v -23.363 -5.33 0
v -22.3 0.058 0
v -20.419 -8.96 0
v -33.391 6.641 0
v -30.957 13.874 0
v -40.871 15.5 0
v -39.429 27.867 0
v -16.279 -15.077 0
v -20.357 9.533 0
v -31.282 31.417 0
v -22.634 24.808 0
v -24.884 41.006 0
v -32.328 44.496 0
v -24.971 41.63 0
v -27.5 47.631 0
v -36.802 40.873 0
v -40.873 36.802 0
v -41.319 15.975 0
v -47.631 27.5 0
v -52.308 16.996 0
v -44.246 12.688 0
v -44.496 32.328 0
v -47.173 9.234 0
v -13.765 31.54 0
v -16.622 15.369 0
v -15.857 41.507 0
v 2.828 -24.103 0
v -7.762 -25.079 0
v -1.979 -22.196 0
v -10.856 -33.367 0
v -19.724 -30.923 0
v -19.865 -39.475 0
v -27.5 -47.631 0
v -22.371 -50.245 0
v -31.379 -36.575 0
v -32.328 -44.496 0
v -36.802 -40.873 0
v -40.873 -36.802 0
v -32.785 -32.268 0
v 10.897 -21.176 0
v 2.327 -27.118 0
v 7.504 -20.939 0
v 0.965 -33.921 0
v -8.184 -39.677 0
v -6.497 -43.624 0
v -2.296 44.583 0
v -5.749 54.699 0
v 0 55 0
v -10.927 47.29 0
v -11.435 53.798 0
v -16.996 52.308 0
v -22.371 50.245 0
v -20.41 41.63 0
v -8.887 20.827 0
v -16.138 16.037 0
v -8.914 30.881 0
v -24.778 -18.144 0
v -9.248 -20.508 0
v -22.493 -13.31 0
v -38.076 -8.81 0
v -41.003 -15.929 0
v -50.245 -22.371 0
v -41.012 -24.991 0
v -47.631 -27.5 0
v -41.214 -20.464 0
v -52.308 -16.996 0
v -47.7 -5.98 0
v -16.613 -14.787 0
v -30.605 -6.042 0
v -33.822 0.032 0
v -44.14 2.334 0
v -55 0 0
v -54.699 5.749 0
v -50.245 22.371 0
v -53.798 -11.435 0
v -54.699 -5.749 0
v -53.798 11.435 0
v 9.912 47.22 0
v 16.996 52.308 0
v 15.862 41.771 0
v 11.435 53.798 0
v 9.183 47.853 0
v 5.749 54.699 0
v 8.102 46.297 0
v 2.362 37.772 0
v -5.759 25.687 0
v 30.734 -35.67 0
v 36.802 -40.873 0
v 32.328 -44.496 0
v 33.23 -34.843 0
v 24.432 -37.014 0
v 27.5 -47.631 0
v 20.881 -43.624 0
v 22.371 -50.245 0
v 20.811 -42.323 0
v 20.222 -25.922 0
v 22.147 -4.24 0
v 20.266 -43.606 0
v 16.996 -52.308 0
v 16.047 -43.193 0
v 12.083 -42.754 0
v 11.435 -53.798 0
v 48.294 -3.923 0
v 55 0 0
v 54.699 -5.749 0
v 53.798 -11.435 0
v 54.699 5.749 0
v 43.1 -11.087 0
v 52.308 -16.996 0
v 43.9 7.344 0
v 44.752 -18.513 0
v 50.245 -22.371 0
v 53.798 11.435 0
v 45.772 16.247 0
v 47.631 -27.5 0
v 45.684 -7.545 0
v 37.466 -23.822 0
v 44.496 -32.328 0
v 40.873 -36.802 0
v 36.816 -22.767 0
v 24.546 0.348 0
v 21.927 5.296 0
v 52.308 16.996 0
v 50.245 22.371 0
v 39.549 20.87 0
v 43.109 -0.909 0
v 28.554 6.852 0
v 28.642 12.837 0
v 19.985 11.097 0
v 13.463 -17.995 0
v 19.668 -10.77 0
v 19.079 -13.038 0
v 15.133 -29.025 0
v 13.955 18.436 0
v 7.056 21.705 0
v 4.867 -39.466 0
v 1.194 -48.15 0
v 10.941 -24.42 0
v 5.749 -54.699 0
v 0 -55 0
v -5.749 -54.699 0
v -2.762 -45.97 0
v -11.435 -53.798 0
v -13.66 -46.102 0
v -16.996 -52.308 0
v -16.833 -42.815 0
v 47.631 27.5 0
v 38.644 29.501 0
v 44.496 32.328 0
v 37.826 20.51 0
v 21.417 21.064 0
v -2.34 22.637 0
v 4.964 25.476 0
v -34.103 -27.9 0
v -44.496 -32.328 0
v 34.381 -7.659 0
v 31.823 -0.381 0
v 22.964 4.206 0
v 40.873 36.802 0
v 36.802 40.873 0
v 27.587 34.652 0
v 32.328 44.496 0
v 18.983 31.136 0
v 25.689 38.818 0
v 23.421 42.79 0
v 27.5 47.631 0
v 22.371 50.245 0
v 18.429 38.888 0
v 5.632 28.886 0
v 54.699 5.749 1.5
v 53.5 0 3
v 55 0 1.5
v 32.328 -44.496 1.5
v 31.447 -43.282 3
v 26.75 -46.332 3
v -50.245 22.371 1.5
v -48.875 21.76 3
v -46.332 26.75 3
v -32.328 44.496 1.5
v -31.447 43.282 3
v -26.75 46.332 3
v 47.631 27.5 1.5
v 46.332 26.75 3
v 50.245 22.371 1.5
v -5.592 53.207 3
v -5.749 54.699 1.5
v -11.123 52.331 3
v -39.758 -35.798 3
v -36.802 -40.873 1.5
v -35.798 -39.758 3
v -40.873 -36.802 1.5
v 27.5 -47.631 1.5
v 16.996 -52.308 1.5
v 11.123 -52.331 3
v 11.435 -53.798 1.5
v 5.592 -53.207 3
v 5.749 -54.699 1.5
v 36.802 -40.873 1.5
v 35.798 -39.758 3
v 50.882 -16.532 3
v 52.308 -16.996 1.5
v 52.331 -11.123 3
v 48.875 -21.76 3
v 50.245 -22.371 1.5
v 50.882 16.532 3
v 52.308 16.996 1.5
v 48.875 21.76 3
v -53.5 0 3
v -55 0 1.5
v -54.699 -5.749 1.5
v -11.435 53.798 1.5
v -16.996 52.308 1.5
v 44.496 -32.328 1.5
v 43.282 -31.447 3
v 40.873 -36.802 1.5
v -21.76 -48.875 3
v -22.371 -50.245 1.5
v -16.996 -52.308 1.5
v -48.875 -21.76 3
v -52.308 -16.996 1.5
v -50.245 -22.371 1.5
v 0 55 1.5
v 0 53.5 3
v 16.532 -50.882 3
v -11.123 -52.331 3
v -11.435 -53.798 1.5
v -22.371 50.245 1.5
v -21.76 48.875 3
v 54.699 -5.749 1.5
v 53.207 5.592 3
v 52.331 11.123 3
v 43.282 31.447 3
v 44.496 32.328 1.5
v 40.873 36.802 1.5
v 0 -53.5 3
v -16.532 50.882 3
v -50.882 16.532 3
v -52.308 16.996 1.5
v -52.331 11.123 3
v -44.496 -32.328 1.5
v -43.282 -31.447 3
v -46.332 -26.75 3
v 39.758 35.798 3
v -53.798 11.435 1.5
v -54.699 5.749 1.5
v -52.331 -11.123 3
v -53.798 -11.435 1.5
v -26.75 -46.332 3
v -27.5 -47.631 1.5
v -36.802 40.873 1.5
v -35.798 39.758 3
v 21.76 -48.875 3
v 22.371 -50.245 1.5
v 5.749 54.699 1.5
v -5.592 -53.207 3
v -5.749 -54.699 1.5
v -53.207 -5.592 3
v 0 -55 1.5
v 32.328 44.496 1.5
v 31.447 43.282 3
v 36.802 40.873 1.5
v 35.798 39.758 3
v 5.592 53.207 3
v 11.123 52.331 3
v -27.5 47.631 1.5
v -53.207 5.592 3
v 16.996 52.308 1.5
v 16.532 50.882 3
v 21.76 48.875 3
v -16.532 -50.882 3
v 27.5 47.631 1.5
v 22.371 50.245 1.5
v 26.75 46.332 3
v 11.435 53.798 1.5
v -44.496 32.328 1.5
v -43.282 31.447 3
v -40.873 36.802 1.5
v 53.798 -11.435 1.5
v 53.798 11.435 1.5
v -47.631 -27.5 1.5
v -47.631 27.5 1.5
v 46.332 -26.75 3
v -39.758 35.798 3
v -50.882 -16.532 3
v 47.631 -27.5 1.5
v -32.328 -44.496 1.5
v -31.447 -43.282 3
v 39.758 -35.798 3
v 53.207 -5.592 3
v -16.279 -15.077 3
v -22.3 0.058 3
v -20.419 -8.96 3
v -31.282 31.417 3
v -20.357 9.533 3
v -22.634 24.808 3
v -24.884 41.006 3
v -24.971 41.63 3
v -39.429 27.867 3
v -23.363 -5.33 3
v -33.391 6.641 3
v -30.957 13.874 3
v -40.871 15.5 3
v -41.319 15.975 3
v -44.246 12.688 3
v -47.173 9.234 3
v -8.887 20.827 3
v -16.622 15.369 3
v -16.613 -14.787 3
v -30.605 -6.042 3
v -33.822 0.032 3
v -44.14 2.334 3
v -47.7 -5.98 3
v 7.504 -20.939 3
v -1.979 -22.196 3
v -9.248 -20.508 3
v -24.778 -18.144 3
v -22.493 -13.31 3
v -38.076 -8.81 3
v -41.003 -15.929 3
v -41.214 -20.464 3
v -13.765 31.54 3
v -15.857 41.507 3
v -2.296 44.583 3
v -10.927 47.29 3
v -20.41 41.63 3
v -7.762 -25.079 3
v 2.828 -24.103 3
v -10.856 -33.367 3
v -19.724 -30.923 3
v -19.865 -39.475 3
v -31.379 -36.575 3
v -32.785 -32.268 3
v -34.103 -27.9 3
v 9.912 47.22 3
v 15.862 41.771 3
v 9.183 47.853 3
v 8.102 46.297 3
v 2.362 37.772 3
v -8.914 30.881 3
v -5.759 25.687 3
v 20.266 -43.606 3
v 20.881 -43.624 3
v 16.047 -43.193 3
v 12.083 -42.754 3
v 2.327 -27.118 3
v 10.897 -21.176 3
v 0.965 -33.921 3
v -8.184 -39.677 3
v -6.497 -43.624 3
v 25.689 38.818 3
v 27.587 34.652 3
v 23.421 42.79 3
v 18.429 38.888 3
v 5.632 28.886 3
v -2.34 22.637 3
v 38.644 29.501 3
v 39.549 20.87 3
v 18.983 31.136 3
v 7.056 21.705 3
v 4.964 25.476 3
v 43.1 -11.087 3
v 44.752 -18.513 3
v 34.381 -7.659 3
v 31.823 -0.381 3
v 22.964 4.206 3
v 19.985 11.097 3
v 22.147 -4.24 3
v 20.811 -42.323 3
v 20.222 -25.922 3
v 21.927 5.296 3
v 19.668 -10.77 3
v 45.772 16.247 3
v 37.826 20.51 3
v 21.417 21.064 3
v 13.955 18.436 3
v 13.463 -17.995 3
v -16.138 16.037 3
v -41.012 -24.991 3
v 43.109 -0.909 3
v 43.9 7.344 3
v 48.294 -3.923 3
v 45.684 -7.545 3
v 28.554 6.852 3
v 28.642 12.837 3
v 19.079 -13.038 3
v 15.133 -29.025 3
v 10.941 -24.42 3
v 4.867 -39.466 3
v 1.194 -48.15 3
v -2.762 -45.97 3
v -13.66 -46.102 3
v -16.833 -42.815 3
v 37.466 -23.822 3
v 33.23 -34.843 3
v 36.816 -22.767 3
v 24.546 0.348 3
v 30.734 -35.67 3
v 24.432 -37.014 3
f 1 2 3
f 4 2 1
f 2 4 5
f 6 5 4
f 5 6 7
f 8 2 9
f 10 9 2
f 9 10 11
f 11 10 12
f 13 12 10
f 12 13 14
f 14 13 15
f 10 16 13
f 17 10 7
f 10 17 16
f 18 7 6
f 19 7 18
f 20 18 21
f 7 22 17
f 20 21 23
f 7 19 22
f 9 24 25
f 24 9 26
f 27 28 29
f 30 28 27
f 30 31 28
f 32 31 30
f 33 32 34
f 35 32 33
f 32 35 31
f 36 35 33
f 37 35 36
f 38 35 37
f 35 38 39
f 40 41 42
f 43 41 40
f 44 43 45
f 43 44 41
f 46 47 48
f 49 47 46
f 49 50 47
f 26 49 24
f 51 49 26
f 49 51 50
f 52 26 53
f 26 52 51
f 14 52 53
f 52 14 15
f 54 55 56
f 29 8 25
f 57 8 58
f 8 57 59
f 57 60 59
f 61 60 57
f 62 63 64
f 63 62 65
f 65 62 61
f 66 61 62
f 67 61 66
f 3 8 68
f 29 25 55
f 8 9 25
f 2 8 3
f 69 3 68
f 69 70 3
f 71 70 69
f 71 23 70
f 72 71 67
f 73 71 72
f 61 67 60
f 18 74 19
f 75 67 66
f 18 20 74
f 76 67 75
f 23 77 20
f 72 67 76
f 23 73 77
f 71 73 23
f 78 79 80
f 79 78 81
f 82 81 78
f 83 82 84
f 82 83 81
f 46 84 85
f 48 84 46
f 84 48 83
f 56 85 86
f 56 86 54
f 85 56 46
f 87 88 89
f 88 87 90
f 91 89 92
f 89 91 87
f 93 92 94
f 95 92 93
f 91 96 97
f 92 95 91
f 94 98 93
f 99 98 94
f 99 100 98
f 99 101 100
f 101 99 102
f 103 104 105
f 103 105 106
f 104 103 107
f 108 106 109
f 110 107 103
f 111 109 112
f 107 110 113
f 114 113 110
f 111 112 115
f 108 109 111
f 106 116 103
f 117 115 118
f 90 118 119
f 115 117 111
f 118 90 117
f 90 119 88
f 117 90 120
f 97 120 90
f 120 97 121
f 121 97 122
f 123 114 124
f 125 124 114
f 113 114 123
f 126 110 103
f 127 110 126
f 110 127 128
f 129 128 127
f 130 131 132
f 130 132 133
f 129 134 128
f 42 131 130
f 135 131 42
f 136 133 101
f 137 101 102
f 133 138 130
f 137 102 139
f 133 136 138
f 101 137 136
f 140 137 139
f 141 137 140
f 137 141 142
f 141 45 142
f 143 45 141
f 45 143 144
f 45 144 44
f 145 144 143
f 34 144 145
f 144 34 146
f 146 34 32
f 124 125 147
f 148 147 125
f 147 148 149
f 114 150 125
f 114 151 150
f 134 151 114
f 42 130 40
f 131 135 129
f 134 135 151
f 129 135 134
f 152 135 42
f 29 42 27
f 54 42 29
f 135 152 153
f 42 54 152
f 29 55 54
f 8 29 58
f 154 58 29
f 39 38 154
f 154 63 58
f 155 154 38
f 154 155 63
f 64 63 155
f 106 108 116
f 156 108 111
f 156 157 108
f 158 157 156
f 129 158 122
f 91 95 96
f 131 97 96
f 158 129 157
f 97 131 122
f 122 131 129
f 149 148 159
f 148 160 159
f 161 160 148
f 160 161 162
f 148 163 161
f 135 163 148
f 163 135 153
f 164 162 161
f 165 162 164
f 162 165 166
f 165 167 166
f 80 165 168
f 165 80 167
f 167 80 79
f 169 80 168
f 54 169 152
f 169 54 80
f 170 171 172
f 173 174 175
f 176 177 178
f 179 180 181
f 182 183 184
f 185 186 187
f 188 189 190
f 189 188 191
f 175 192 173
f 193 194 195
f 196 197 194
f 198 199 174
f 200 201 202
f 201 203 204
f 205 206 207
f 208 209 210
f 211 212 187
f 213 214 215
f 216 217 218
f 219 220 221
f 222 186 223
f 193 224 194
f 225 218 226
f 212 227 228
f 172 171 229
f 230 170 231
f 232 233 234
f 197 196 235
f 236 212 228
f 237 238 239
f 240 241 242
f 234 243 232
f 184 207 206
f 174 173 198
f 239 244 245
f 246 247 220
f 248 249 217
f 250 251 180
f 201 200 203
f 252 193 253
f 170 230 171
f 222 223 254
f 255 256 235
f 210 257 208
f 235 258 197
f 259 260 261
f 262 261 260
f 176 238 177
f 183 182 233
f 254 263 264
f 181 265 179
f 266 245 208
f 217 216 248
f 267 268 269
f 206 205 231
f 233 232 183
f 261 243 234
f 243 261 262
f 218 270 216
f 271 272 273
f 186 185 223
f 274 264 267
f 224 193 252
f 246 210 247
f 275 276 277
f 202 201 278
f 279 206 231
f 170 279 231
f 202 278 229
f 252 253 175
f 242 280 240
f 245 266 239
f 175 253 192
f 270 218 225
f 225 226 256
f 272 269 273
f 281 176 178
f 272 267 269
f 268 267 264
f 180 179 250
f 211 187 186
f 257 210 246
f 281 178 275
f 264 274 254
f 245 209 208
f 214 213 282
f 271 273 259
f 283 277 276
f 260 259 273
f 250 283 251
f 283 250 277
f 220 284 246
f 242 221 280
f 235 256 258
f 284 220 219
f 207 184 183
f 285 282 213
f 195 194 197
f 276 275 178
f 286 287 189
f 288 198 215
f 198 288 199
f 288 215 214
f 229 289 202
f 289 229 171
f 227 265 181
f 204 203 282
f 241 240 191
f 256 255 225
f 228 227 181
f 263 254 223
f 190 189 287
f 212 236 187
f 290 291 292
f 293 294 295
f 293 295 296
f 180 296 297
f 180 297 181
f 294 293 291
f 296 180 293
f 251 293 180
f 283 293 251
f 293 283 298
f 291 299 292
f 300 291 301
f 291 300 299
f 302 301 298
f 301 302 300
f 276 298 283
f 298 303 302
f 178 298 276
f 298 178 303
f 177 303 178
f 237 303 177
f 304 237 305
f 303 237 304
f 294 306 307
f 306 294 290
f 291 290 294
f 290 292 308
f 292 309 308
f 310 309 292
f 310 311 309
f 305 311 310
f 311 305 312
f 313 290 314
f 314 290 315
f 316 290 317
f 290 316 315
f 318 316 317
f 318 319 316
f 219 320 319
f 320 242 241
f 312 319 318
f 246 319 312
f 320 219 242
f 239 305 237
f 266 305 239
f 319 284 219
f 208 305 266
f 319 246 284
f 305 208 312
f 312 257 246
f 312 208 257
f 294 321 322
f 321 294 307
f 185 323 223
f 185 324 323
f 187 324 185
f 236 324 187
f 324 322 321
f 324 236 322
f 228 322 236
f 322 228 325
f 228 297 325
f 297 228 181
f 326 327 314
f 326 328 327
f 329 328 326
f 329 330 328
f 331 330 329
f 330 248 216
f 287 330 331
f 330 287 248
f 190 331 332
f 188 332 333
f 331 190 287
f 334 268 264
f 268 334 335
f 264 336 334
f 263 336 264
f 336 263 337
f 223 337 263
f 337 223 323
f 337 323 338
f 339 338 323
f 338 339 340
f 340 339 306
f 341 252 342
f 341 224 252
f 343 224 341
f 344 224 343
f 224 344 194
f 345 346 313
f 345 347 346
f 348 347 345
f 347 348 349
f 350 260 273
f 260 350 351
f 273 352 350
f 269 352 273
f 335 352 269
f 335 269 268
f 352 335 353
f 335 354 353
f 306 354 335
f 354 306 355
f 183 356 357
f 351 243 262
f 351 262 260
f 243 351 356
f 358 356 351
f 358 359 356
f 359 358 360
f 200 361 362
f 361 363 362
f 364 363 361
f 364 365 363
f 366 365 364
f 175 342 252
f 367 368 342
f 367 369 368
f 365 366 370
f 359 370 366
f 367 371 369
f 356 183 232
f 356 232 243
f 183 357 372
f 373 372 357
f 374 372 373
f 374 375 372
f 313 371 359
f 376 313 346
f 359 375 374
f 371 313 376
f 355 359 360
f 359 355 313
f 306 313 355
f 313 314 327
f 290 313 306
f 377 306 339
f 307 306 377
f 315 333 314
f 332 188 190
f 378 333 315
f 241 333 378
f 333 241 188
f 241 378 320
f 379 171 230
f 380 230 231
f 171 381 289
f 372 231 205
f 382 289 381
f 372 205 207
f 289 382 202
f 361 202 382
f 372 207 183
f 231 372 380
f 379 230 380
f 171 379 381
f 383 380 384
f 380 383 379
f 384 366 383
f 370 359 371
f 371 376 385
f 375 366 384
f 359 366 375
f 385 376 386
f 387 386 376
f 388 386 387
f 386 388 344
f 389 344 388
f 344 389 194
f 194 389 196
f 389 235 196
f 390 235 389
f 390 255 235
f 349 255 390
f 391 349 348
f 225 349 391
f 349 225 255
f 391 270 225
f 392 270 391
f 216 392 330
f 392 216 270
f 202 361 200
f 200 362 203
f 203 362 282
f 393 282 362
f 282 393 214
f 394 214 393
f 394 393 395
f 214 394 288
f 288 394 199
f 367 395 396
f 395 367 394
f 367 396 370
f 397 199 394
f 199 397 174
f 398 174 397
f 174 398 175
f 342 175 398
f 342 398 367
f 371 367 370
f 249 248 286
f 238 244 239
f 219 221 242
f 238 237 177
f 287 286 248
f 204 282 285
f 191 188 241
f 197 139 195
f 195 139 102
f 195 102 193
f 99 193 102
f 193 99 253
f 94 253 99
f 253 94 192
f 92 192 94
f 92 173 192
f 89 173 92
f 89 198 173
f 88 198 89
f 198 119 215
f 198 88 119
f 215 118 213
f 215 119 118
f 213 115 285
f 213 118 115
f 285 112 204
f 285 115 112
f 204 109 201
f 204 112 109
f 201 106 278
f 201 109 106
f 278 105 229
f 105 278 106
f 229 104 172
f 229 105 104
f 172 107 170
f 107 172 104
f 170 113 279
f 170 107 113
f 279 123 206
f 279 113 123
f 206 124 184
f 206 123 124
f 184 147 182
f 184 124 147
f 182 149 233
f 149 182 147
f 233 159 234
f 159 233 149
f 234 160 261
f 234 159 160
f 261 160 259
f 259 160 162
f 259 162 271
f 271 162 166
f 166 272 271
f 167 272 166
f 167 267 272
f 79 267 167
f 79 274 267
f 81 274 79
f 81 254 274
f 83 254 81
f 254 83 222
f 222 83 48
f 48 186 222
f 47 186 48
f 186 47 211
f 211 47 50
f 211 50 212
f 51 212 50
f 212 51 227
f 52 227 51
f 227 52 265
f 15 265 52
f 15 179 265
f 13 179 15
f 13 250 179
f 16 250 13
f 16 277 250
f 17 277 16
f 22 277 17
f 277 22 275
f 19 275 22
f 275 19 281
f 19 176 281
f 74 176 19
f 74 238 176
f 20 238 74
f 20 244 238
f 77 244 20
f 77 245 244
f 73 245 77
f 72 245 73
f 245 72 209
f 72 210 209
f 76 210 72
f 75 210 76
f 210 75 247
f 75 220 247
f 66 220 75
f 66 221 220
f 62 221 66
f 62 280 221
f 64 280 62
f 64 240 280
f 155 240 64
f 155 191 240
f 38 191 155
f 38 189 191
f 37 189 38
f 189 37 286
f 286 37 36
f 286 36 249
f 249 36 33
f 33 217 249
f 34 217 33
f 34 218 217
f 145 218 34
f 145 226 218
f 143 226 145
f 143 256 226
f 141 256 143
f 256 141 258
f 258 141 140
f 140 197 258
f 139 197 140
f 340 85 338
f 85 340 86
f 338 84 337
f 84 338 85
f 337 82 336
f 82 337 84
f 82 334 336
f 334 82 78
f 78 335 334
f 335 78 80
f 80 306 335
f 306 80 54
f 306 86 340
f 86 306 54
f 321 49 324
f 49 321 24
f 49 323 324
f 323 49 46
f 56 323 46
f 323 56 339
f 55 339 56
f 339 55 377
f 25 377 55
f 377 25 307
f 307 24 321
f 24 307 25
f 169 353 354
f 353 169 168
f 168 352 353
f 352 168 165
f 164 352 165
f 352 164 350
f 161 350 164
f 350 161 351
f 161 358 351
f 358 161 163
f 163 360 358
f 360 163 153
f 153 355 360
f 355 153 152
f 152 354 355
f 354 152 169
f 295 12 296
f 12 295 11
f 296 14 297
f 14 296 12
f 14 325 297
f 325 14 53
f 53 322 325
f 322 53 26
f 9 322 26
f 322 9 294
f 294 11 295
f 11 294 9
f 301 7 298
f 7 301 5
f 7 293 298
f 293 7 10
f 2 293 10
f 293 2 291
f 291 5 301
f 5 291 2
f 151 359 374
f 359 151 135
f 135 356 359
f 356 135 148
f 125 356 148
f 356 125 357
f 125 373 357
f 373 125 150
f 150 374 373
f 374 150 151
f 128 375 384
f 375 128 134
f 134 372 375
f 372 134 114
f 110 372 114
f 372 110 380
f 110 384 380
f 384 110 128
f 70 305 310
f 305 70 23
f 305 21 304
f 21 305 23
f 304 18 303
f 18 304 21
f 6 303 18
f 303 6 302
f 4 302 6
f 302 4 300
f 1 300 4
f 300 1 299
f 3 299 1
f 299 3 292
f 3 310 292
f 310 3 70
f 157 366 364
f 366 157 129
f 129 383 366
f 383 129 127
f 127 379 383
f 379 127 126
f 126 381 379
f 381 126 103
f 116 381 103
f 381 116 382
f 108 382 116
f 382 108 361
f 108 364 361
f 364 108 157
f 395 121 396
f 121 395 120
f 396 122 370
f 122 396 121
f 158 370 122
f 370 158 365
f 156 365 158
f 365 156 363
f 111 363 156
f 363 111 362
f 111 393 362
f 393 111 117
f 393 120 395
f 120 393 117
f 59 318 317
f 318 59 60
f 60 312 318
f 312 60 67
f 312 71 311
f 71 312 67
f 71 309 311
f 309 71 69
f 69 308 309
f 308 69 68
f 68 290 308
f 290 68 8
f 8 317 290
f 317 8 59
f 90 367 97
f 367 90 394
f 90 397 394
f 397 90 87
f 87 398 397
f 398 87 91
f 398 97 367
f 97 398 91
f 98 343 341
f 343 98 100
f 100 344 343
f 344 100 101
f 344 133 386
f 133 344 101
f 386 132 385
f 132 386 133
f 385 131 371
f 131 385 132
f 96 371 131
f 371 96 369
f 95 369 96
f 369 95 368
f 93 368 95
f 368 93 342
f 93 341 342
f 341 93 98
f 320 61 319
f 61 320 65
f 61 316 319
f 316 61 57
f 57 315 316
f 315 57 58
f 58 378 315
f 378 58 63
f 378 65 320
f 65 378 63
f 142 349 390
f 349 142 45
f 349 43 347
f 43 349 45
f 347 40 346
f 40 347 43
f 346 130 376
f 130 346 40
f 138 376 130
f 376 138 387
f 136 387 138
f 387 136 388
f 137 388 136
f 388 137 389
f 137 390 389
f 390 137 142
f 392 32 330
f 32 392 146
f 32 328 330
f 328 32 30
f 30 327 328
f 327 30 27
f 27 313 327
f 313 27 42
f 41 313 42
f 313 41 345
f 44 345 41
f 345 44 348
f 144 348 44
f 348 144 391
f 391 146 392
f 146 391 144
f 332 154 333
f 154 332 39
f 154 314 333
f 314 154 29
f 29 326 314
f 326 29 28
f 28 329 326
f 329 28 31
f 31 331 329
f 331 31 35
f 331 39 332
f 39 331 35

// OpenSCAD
// edit these values to parameterize your coaster

height = 3; // mm
// a standard coffee mug is about 90mm wide
logoDiameter = 90; // mm
coasterDiameter = 110; // mm
bevelRadius = height/2; // mm

// don't edit below here

intersection() {
    baseLogo();
    beveledDisk();
}

module baseLogo () {
    color("blue")
    linear_extrude(0, 0, height)
            difference() {
                circle(d = coasterDiameter, $fn = 60, center = true);
         
                scale(logoDiameter/10, logoDiameter/10, 1)
                    // center the logo - it's off-center a little bit in the source image.
                    // internally, it's 10mm x 10mm.
                    translate([-5.3, -5.35, 0])
                        import("datica-logo.dxf", center = true);
            };
}

module beveledDisk() {
    linear_extrude(0, 0, height/2)
        circle(d = coasterDiameter, $fn = 60, center = true);
    translate([0, 0, height/2])
        cylinder(h = height/2, d1 = coasterDiameter, d2 = coasterDiameter - 2 * bevelRadius, $fn = 60, center = false);
}
